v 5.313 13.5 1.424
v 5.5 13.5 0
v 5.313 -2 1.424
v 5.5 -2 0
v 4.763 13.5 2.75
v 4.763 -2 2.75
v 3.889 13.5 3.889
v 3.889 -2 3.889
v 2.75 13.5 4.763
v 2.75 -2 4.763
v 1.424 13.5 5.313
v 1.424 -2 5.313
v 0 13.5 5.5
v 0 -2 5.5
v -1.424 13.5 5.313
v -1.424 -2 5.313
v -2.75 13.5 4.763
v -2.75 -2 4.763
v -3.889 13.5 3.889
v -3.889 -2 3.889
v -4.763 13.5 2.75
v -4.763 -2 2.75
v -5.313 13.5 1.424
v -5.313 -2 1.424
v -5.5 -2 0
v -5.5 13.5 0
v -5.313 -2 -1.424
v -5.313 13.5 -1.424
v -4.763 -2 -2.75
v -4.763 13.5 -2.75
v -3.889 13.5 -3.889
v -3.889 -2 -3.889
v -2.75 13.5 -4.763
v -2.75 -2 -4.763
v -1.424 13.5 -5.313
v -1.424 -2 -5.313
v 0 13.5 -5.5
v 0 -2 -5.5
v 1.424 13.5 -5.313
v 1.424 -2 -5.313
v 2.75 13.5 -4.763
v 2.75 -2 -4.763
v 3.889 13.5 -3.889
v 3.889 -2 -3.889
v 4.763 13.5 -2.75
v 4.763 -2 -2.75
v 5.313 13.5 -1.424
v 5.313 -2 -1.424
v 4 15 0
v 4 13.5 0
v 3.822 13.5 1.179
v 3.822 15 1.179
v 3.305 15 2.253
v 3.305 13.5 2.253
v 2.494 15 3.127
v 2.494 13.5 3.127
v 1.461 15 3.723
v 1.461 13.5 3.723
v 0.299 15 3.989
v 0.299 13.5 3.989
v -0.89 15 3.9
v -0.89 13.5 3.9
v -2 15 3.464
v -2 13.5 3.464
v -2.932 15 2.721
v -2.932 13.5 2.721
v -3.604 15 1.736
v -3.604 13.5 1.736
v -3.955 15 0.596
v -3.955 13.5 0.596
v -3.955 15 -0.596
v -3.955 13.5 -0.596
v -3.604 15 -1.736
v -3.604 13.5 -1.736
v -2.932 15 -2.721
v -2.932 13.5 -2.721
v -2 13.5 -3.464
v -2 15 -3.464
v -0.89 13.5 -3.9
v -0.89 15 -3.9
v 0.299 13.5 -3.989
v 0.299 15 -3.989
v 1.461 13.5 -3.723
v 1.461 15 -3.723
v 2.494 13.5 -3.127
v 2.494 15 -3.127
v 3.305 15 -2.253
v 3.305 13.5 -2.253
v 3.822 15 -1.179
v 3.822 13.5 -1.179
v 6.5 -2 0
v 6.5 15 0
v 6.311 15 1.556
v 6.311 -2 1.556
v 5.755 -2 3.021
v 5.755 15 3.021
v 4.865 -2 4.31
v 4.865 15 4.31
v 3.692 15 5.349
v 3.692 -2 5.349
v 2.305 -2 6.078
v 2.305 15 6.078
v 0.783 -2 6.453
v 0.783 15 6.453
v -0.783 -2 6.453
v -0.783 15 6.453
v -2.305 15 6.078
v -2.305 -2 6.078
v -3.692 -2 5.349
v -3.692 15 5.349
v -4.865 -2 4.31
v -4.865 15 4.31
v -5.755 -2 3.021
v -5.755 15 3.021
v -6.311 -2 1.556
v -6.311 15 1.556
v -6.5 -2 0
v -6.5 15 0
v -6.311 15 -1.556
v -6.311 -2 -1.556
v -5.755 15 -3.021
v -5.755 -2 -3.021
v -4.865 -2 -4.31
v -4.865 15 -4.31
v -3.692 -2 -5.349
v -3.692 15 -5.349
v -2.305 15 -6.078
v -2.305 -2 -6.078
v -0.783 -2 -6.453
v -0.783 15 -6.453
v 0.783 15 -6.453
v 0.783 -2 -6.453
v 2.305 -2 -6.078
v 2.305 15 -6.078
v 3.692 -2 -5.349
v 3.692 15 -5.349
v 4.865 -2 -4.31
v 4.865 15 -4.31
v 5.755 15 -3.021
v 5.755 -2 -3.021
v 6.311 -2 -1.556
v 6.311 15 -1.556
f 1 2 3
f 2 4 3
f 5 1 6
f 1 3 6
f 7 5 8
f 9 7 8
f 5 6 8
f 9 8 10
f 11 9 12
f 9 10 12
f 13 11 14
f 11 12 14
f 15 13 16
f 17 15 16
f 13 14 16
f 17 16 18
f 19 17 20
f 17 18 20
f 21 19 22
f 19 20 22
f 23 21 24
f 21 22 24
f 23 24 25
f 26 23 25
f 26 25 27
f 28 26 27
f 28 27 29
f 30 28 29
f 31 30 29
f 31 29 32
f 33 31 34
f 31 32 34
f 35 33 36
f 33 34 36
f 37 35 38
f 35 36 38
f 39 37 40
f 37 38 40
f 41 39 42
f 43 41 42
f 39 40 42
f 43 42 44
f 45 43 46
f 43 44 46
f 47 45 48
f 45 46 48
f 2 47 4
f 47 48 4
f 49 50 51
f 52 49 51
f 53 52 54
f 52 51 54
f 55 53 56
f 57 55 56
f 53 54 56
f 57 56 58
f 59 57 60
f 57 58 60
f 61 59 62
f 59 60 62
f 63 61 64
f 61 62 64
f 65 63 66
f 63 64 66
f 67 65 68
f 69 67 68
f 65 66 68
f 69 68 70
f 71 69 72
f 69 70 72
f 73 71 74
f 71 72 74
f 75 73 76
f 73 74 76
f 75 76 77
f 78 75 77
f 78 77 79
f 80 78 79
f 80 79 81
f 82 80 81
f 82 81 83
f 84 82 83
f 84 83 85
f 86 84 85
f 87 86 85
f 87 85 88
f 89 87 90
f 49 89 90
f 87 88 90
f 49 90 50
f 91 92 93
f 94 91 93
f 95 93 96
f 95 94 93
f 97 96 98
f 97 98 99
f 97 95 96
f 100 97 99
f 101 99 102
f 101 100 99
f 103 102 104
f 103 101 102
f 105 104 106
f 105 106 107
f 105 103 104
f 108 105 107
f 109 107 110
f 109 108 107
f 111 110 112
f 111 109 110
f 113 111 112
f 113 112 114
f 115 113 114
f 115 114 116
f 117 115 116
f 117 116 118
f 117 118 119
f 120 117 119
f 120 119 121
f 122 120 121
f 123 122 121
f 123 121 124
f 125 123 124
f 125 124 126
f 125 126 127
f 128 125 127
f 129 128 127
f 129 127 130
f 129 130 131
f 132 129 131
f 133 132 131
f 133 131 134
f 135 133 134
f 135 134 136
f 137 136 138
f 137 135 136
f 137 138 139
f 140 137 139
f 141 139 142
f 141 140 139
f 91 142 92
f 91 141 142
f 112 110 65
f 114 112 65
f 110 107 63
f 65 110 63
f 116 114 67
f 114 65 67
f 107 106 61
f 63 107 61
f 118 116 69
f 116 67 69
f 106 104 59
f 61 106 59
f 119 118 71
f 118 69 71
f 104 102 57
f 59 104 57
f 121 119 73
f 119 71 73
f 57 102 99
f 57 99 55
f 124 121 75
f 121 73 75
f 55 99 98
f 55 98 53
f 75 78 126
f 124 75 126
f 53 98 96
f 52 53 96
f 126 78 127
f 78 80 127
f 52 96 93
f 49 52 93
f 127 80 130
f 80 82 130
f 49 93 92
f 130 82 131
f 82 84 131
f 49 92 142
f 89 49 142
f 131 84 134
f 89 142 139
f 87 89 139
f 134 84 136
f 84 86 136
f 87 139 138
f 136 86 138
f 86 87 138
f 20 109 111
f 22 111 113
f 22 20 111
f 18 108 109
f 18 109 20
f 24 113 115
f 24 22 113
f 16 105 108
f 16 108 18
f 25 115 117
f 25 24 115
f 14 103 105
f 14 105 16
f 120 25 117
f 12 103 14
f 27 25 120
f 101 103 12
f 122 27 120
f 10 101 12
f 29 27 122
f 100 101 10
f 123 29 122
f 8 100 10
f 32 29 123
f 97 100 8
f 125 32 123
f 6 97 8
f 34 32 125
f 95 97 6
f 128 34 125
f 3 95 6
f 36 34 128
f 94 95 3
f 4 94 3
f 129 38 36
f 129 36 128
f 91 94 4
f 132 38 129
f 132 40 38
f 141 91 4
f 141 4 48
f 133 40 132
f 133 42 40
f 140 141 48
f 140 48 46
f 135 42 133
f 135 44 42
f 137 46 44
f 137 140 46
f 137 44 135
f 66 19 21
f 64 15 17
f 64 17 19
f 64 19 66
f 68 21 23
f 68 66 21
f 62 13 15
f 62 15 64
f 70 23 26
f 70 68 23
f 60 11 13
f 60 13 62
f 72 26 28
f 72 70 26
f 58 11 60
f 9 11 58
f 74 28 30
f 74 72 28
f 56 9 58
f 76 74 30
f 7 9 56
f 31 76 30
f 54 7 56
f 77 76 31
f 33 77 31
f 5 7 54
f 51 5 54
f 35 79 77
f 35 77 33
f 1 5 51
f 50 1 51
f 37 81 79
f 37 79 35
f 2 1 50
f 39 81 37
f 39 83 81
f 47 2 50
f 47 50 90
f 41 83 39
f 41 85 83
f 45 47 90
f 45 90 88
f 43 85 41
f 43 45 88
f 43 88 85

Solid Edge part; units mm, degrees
sketch "Sketch1" plane through (0, 0, 0) normal (0, -1, 0) x (1, 0, 0)
  circle A0 centre (0, 0) radius 6.5
extrude "Protrusion1" add sketch "Sketch1" against normal blind 15
sketch "Sketch2" plane through (0, 0, 0) normal (0, -1, 0) x (1, 0, 0)
  circle A0 centre (0, 0) radius 6.5
extrude "holder" add sketch "Sketch2" along normal blind 2
sketch "Sketch3" plane through (0, -2, 0) normal (0, -1, 0) x (1, 0, 0)
  circle A0 centre (0, 0) radius 4
extrude "Cutout1" cut sketch "Sketch3" against normal through all
sketch "Sketch4" plane through (0, -2, 0) normal (0, -1, 0) x (1, 0, 0)
  circle A0 centre (0, 0) radius 5.5
extrude "Cutout2" cut sketch "Sketch4" against normal blind 15.5
